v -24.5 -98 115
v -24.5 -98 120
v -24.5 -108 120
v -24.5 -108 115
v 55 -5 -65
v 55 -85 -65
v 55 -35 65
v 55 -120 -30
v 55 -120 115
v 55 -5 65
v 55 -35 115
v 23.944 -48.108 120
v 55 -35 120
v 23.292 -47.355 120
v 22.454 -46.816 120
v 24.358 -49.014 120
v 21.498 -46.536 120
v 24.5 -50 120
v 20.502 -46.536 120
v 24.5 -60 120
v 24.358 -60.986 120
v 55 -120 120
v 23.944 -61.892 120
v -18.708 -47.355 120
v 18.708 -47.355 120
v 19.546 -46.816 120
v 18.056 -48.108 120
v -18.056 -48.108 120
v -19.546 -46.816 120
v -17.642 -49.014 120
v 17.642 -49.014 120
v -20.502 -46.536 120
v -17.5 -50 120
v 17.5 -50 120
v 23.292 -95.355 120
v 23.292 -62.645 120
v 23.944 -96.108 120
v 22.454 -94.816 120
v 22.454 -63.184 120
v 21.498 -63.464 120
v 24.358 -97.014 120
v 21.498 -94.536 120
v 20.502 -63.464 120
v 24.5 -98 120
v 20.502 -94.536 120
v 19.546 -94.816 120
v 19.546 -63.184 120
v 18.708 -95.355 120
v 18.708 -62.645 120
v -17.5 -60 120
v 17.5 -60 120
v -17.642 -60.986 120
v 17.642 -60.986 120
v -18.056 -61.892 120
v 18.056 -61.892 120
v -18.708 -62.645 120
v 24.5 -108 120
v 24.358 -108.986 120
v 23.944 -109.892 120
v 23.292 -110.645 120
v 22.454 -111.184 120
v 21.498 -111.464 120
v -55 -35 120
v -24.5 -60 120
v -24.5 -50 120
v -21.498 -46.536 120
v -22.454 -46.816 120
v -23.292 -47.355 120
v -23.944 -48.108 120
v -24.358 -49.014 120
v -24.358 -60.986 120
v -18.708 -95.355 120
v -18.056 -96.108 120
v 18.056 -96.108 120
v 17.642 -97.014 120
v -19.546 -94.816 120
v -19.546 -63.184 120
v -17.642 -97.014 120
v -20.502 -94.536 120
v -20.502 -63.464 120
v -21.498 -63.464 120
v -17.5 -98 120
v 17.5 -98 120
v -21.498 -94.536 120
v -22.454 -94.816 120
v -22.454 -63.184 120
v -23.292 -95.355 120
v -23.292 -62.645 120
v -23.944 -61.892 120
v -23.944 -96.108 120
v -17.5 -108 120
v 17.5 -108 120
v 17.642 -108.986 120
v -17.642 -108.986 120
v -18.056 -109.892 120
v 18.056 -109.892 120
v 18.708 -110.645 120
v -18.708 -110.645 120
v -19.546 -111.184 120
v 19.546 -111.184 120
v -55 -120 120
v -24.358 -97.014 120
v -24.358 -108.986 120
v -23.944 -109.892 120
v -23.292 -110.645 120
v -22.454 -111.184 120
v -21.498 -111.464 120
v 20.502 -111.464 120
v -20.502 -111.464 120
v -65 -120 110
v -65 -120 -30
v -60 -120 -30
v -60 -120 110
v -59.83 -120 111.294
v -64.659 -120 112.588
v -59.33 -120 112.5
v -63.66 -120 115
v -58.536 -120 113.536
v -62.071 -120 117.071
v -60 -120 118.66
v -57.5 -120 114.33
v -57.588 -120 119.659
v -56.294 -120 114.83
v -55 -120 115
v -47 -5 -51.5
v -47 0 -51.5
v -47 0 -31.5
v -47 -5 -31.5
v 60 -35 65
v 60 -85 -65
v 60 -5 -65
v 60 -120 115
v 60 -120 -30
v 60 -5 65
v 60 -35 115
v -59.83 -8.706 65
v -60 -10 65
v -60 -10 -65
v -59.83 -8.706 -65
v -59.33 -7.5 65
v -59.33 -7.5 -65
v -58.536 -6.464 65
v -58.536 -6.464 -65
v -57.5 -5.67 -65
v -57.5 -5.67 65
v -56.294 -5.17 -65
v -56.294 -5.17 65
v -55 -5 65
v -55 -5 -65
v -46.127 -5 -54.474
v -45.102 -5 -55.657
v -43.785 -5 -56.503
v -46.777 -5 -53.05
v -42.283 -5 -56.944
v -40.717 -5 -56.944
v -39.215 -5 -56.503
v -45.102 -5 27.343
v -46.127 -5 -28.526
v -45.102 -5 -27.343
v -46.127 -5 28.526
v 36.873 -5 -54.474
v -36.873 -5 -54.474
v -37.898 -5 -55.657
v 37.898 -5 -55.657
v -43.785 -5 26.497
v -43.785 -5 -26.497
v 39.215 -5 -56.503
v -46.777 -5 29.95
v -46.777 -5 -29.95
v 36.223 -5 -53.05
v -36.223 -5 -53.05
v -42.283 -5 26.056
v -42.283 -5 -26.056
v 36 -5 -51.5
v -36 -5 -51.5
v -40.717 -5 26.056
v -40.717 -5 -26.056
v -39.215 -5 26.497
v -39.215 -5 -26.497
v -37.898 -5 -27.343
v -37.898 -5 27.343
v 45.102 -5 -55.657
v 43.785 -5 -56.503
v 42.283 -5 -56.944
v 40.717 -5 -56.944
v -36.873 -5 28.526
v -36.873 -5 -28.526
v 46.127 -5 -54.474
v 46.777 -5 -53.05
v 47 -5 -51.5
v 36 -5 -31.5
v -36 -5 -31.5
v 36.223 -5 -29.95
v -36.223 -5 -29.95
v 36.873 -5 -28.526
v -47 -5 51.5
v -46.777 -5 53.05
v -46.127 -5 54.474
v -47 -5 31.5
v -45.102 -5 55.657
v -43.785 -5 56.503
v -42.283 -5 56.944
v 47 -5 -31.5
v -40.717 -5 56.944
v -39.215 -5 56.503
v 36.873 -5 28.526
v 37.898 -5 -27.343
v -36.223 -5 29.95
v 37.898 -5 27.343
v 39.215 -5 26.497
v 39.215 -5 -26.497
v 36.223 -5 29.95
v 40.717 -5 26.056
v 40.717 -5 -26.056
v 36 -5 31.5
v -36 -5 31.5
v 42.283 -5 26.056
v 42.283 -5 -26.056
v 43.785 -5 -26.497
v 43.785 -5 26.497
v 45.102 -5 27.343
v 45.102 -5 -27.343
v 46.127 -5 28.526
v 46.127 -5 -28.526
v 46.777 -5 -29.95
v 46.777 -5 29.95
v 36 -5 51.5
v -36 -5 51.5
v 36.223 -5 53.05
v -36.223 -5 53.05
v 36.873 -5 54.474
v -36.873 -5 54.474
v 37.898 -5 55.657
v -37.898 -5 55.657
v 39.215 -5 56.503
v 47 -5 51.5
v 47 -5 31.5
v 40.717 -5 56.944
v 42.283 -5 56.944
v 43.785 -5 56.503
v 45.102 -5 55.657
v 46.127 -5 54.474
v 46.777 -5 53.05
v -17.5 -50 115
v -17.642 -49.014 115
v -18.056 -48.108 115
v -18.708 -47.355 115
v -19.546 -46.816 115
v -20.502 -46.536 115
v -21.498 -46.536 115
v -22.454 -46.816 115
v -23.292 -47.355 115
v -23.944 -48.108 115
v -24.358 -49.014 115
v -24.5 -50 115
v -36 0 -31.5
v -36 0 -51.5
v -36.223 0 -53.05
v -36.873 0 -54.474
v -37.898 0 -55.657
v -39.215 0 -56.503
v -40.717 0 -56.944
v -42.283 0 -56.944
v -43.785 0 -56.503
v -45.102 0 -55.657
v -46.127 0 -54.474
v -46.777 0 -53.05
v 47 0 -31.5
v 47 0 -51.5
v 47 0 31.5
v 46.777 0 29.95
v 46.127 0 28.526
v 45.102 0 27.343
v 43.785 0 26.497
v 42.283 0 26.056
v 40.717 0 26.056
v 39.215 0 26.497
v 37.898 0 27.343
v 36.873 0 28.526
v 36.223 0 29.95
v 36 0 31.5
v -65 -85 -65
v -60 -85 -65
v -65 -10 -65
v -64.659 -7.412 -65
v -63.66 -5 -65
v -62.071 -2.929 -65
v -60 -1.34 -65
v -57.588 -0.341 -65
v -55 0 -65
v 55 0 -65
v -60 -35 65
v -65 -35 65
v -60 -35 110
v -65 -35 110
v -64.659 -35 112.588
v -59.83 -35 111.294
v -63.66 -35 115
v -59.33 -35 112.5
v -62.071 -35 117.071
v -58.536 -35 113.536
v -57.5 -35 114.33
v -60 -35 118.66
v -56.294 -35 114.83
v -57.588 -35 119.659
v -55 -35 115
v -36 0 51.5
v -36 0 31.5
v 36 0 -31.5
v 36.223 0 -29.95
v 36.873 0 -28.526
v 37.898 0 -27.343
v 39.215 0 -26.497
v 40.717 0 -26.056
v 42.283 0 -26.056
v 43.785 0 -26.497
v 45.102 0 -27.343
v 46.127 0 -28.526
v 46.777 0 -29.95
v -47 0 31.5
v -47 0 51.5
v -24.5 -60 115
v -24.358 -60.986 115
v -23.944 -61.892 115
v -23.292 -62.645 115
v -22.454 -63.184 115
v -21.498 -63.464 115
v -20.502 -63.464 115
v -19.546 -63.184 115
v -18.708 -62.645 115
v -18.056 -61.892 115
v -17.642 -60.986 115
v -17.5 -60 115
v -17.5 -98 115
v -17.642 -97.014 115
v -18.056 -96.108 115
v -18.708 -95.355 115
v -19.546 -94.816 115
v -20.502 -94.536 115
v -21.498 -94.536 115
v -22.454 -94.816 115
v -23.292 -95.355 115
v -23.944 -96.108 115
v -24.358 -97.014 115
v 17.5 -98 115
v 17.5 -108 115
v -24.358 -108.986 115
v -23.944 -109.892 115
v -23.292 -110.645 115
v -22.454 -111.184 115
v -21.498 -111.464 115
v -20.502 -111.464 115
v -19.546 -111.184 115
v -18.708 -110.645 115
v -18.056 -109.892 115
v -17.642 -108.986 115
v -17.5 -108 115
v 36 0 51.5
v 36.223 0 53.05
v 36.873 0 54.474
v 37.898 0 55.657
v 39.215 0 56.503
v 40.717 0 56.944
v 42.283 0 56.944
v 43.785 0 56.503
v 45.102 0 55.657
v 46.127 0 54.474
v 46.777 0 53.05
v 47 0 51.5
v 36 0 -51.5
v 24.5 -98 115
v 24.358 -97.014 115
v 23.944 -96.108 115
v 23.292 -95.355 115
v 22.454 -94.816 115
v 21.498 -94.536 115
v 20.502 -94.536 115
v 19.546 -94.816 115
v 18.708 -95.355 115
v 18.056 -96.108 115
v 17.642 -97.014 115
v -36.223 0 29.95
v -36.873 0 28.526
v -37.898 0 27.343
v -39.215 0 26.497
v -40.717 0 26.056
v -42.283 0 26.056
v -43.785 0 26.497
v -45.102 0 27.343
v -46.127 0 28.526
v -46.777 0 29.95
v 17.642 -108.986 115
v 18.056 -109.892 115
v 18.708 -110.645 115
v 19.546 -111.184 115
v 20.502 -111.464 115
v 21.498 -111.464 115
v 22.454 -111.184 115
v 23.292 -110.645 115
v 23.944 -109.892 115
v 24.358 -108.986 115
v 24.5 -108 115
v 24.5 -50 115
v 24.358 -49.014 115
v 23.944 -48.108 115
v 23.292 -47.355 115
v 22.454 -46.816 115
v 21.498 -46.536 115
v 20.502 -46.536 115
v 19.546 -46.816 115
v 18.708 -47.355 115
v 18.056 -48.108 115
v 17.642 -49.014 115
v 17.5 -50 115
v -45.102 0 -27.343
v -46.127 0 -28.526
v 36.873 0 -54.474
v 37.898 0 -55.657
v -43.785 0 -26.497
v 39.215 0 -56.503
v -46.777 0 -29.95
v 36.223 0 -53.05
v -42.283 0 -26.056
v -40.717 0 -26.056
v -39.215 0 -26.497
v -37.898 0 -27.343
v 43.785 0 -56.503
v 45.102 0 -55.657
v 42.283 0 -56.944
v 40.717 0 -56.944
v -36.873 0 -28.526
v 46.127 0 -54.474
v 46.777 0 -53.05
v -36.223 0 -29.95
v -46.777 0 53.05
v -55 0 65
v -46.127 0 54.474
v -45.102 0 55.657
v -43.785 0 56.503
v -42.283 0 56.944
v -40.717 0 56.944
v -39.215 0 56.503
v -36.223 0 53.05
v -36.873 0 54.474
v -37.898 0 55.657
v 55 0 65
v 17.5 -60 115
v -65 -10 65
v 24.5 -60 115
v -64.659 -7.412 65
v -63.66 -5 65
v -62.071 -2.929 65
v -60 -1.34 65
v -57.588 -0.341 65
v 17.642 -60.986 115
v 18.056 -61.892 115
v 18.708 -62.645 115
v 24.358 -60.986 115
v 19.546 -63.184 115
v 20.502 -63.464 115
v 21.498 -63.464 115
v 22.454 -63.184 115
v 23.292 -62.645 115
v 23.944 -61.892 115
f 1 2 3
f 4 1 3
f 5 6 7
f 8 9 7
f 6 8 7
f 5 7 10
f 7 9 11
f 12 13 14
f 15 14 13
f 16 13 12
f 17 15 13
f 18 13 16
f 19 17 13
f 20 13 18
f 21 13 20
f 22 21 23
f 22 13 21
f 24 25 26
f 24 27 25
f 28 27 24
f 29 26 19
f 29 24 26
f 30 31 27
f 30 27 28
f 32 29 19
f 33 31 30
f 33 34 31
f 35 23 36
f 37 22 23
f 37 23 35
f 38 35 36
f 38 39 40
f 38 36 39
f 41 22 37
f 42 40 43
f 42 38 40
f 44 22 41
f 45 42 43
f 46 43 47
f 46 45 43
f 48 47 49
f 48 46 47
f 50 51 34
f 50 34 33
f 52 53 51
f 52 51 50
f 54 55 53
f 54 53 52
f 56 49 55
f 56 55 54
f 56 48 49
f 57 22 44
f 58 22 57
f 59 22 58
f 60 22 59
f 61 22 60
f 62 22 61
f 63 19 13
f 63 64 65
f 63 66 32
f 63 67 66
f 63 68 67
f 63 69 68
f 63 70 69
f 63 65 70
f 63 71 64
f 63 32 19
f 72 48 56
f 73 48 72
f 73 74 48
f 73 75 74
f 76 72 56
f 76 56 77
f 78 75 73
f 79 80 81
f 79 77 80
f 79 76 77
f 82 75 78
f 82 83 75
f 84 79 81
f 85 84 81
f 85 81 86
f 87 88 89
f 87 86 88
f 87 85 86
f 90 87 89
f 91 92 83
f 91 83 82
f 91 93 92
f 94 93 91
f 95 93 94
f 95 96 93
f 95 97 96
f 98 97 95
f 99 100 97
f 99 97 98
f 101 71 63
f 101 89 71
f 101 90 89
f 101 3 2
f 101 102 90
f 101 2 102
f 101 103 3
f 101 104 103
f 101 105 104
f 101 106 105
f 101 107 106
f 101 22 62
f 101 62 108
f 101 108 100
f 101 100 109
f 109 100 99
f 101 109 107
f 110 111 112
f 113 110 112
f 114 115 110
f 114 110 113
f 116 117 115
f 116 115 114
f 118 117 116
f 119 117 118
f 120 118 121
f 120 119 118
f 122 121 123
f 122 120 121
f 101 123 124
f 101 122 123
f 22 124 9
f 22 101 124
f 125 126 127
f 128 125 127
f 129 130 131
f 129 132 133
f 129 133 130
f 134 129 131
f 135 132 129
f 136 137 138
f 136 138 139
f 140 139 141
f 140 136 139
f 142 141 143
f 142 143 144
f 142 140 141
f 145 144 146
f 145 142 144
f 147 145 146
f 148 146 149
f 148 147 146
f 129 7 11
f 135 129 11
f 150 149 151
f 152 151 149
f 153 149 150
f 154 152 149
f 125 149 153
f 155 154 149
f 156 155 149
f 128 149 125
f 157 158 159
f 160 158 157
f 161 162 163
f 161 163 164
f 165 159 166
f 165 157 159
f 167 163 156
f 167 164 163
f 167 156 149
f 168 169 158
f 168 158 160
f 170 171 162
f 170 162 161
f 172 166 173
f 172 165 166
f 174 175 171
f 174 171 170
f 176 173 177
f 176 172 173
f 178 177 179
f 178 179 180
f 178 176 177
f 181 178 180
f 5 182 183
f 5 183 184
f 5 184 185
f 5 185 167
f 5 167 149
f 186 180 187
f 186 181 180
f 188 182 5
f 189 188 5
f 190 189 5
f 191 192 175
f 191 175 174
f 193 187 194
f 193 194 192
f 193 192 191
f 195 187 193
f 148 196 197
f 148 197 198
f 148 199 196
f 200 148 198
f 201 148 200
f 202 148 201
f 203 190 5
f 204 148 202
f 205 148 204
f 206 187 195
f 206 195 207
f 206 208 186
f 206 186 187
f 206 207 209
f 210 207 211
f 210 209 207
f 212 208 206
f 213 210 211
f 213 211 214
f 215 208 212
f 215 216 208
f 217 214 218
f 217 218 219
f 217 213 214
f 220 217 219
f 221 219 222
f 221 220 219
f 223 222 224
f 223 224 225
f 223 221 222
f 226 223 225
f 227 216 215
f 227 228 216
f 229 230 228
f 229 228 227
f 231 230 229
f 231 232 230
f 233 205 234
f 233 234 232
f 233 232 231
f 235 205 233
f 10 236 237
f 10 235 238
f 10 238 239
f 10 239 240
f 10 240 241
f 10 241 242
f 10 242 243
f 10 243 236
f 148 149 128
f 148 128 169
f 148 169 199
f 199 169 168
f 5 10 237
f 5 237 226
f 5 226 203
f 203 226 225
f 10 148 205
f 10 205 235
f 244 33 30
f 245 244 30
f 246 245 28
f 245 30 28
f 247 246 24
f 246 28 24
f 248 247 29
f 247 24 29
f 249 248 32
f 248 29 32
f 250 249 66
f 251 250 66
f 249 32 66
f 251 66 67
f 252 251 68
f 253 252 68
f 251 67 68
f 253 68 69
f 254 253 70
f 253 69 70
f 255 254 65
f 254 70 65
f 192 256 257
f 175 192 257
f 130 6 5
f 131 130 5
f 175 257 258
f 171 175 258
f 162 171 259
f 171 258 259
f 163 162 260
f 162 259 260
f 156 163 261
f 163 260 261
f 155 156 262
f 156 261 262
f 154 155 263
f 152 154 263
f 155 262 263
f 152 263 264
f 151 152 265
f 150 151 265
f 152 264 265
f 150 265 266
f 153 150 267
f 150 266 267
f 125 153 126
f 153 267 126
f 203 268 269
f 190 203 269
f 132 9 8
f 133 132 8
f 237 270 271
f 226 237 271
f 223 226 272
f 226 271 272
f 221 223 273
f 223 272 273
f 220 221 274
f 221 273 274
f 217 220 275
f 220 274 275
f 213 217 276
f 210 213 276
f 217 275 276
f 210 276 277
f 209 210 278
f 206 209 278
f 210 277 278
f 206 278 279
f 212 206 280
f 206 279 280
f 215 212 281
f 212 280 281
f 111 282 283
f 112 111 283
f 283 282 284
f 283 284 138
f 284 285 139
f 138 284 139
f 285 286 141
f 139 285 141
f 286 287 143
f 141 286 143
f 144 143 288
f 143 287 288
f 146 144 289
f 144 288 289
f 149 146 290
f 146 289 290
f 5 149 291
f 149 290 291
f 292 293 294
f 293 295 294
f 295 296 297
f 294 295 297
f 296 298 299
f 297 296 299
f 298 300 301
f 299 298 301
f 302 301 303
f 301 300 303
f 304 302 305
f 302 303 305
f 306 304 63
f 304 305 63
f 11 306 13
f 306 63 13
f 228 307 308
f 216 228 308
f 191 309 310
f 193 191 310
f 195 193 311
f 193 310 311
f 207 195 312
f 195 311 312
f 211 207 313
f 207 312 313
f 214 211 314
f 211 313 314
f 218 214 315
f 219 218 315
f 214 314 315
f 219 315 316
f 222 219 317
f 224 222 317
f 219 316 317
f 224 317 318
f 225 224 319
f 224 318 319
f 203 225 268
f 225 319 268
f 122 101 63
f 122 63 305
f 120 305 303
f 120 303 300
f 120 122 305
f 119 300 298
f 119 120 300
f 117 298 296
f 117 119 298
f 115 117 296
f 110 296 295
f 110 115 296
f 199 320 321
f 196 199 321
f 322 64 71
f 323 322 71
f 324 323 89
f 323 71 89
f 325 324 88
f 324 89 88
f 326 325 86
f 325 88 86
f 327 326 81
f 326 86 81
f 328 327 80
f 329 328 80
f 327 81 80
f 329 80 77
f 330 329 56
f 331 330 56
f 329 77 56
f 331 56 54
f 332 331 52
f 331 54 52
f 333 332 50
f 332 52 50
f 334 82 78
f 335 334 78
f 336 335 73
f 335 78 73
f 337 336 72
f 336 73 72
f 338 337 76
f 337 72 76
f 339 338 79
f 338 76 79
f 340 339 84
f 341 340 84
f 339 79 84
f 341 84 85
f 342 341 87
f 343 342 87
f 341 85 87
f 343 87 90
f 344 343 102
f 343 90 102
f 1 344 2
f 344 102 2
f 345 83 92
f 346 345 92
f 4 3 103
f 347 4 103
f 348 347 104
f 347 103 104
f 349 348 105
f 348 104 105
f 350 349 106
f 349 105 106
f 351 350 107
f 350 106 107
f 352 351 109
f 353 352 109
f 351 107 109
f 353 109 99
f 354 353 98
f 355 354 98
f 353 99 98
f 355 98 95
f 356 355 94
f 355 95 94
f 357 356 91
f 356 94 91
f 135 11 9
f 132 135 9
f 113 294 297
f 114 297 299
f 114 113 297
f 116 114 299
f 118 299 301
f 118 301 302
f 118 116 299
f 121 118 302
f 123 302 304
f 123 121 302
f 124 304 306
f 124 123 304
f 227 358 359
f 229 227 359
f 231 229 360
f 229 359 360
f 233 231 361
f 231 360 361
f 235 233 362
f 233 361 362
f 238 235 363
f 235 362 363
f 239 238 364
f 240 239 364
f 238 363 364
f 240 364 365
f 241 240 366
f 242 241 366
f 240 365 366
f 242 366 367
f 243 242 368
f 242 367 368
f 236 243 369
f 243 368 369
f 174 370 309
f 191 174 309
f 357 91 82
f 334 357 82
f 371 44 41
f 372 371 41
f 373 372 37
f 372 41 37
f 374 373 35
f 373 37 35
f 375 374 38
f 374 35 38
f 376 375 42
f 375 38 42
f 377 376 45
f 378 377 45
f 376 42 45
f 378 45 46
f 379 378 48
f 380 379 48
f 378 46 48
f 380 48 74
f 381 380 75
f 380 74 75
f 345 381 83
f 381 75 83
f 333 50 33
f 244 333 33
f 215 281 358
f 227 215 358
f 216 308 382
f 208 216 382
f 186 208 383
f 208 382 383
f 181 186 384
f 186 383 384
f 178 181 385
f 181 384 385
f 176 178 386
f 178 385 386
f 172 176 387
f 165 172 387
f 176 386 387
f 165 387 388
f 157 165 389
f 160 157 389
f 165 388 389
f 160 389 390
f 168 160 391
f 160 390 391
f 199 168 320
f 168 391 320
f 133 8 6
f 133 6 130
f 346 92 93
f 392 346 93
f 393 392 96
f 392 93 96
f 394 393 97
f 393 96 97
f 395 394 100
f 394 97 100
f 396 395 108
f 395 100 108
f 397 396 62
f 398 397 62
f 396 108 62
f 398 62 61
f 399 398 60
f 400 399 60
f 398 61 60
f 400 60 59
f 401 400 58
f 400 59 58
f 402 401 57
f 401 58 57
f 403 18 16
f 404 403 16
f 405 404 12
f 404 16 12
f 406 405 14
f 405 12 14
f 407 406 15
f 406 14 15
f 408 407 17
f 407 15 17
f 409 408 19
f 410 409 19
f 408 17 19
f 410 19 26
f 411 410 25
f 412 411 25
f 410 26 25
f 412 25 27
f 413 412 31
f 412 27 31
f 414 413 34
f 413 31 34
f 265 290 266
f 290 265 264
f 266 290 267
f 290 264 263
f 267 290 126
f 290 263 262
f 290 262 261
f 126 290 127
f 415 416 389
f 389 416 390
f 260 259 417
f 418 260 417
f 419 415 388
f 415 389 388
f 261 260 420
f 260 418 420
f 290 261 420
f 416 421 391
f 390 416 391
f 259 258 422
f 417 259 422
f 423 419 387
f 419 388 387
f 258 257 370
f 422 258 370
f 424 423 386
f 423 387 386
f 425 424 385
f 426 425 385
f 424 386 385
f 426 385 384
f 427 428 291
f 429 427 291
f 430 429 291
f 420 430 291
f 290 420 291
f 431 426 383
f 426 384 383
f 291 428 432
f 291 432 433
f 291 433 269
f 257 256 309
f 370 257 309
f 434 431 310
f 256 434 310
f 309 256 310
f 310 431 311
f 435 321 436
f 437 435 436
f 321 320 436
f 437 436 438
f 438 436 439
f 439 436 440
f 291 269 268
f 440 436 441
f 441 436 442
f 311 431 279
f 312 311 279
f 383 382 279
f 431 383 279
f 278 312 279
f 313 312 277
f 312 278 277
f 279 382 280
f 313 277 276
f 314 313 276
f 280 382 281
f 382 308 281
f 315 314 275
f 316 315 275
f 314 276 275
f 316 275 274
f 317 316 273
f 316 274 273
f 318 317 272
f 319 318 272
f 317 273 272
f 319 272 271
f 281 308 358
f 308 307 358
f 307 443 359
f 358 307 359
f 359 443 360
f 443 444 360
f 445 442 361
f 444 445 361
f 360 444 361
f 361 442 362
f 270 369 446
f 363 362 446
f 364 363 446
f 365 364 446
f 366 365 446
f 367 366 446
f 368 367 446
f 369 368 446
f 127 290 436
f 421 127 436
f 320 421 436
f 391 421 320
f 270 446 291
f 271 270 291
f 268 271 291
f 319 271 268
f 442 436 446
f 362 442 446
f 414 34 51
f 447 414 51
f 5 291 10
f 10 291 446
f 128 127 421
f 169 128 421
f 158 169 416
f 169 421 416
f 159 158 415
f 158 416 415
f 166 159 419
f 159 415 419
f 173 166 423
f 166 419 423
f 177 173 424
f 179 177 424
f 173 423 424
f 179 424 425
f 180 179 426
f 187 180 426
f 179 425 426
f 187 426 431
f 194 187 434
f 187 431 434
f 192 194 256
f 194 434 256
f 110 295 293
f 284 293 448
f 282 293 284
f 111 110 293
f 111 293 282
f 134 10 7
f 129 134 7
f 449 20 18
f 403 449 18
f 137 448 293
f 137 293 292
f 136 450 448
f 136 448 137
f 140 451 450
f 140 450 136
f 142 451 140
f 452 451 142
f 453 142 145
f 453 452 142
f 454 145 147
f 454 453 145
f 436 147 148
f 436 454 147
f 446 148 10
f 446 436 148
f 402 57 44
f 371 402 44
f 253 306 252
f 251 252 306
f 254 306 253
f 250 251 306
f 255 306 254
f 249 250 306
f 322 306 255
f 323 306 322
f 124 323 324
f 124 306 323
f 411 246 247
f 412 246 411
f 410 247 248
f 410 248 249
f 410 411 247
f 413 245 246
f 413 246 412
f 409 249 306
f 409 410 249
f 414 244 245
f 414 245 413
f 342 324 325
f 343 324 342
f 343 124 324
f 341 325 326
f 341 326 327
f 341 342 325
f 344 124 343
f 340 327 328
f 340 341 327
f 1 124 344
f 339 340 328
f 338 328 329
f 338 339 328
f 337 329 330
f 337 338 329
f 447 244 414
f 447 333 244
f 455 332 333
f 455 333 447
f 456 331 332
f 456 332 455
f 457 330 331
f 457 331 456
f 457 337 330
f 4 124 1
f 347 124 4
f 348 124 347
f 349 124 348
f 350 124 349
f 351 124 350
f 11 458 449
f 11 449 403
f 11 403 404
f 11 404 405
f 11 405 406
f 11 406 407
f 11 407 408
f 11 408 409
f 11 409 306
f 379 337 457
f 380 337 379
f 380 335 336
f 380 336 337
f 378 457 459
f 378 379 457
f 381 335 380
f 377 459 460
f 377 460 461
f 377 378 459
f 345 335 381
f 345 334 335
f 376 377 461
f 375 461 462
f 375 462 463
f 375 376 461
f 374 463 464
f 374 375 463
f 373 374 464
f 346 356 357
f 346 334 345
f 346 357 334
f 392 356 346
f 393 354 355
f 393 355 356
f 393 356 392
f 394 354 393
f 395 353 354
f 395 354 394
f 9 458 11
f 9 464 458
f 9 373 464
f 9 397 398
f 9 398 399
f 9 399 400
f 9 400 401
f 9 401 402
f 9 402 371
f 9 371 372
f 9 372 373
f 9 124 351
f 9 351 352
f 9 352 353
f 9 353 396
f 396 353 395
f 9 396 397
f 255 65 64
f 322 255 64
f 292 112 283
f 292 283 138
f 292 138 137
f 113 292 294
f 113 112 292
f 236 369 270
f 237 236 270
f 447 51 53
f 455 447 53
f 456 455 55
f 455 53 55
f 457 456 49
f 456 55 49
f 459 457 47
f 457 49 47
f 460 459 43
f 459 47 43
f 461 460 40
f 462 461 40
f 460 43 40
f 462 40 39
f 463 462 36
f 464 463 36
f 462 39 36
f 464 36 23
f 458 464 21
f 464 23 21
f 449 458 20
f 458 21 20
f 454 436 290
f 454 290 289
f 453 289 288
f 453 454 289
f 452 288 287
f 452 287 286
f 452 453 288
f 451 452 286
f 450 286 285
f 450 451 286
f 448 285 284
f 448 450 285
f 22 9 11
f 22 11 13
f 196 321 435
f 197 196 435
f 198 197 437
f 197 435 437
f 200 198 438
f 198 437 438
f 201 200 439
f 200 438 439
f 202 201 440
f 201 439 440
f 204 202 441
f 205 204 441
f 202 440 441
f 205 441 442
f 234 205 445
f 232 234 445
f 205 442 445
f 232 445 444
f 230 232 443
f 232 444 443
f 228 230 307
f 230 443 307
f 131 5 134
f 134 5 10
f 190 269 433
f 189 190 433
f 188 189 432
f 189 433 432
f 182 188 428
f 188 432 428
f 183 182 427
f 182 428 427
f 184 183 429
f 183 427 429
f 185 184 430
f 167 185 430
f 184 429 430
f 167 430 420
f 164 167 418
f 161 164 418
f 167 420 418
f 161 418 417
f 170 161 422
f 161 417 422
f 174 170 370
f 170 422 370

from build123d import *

# Parameters (mm, degrees)
F0_W       = 110
F0_H       = 130
F1_DEPTH   = 5
F3_DEPTH   = 130
F5_DEPTH   = 85
F7_DEPTH   = 185.001
F9_DEPTH   = 5
F10_SIZE   = 35
F10_2_SIZE = 35


with BuildPart() as f1:
    # F0 (on Front) → F1 (new body)
    with BuildSketch(Plane.XZ):
        Rectangle(F0_W, F0_H)
        with BuildLine():
            ThreePointArc((-36, -51.5), (-41.5, -57), (-47, -51.5))
            Line((-47, -51.5), (-47, -31.5))
            ThreePointArc((-47, -31.5), (-41.5, -26), (-36, -31.5))
            Line((-36, -31.5), (-36, -51.5))
        make_face(mode=Mode.SUBTRACT)
        with BuildLine():
            ThreePointArc((36, -31.5), (41.5, -26), (47, -31.5))
            Line((47, -31.5), (47, -51.5))
            ThreePointArc((47, -51.5), (41.5, -57), (36, -51.5))
            Line((36, -51.5), (36, -31.5))
        make_face(mode=Mode.SUBTRACT)
        with BuildLine():
            Line((-36, 51.5), (-36, 31.5))
            ThreePointArc((-36, 31.5), (-41.5, 26), (-47, 31.5))
            Line((-47, 31.5), (-47, 51.5))
            ThreePointArc((-47, 51.5), (-41.5, 57), (-36, 51.5))
        make_face(mode=Mode.SUBTRACT)
        with BuildLine():
            ThreePointArc((47, 31.5), (41.5, 26), (36, 31.5))
            Line((36, 31.5), (36, 51.5))
            ThreePointArc((36, 51.5), (41.5, 57), (47, 51.5))
            Line((47, 51.5), (47, 31.5))
        make_face(mode=Mode.SUBTRACT)
    extrude(amount=F1_DEPTH)

    # F2 (on face) → F3 (join, through all)
    with BuildSketch(Plane.XY.offset(65)):
        with BuildLine():
            ThreePointArc((-60, -10), (-58.535534, -6.464466), (-55, -5))
            Line((-55, -5), (-55, 0))
            ThreePointArc((-55, 0), (-62.071068, -2.928932), (-65, -10))
            Line((-65, -10), (-65, -120))
            Line((-65, -120), (-60, -120))
            Line((-60, -120), (-60, -10))
        make_face()
    extrude(amount=-F3_DEPTH)

    # F4 (on face) → F5 (join)
    with BuildSketch(Plane.XZ.offset(120)):
        with BuildLine():
            Line((-65, 65), (-60, 65))
            Line((-60, 65), (-60, 110))
            ThreePointArc((-60, 110), (-58.535534, 113.535534), (-55, 115))
            Line((-55, 115), (55, 115))
            Line((55, 115), (55, 120))
            Line((55, 120), (-55, 120))
            ThreePointArc((-55, 120), (-62.071068, 117.071068), (-65, 110))
            Line((-65, 110), (-65, 65))
        make_face()
    extrude(amount=-F5_DEPTH)

    # F6 (on face) → F7 (cut, through all)
    with BuildSketch(Plane.XY.offset(120)):
        with BuildLine():
            Line((17.5, -50), (17.5, -60))
            ThreePointArc((17.5, -60), (21, -63.5), (24.5, -60))
            Line((24.5, -60), (24.5, -50))
            ThreePointArc((24.5, -50), (21, -46.5), (17.5, -50))
        make_face()
        with BuildLine():
            Line((17.5, -98), (17.5, -108))
            ThreePointArc((17.5, -108), (21, -111.5), (24.5, -108))
            Line((24.5, -108), (24.5, -98))
            ThreePointArc((24.5, -98), (21, -94.5), (17.5, -98))
        make_face()
        with BuildLine():
            Line((-24.5, -50), (-24.5, -60))
            ThreePointArc((-24.5, -60), (-21, -63.5), (-17.5, -60))
            Line((-17.5, -60), (-17.5, -50))
            ThreePointArc((-17.5, -50), (-21, -46.5), (-24.5, -50))
        make_face()
        with BuildLine():
            Line((-24.5, -98), (-24.5, -108))
            ThreePointArc((-24.5, -108), (-21, -111.5), (-17.5, -108))
            Line((-17.5, -108), (-17.5, -98))
            ThreePointArc((-17.5, -98), (-21, -94.5), (-24.5, -98))
        make_face()
    extrude(amount=-F7_DEPTH, mode=Mode.SUBTRACT)

    # F10
    f10_edges = [f1.edges().sort_by_distance(p)[0] for p in [
        (-62.5, -120, -65),
    ]]
    chamfer(f10_edges, length=F10_SIZE)


with BuildPart() as f9:
    # F8 (on face) → F9 (new body)
    with BuildSketch(Plane.YZ.offset(55)):
        Polygon((-120, -65), (-5, -65), (-5, 65), (-35, 65), (-35, 115), (-120, 115), align=None)
    extrude(amount=F9_DEPTH)

    # F10#2
    f10_2_edges = [f9.edges().sort_by_distance(p)[0] for p in [
        (57.5, -120, -65),
    ]]
    chamfer(f10_2_edges, length=F10_2_SIZE)


solid = Compound([f1.part, f9.part])
